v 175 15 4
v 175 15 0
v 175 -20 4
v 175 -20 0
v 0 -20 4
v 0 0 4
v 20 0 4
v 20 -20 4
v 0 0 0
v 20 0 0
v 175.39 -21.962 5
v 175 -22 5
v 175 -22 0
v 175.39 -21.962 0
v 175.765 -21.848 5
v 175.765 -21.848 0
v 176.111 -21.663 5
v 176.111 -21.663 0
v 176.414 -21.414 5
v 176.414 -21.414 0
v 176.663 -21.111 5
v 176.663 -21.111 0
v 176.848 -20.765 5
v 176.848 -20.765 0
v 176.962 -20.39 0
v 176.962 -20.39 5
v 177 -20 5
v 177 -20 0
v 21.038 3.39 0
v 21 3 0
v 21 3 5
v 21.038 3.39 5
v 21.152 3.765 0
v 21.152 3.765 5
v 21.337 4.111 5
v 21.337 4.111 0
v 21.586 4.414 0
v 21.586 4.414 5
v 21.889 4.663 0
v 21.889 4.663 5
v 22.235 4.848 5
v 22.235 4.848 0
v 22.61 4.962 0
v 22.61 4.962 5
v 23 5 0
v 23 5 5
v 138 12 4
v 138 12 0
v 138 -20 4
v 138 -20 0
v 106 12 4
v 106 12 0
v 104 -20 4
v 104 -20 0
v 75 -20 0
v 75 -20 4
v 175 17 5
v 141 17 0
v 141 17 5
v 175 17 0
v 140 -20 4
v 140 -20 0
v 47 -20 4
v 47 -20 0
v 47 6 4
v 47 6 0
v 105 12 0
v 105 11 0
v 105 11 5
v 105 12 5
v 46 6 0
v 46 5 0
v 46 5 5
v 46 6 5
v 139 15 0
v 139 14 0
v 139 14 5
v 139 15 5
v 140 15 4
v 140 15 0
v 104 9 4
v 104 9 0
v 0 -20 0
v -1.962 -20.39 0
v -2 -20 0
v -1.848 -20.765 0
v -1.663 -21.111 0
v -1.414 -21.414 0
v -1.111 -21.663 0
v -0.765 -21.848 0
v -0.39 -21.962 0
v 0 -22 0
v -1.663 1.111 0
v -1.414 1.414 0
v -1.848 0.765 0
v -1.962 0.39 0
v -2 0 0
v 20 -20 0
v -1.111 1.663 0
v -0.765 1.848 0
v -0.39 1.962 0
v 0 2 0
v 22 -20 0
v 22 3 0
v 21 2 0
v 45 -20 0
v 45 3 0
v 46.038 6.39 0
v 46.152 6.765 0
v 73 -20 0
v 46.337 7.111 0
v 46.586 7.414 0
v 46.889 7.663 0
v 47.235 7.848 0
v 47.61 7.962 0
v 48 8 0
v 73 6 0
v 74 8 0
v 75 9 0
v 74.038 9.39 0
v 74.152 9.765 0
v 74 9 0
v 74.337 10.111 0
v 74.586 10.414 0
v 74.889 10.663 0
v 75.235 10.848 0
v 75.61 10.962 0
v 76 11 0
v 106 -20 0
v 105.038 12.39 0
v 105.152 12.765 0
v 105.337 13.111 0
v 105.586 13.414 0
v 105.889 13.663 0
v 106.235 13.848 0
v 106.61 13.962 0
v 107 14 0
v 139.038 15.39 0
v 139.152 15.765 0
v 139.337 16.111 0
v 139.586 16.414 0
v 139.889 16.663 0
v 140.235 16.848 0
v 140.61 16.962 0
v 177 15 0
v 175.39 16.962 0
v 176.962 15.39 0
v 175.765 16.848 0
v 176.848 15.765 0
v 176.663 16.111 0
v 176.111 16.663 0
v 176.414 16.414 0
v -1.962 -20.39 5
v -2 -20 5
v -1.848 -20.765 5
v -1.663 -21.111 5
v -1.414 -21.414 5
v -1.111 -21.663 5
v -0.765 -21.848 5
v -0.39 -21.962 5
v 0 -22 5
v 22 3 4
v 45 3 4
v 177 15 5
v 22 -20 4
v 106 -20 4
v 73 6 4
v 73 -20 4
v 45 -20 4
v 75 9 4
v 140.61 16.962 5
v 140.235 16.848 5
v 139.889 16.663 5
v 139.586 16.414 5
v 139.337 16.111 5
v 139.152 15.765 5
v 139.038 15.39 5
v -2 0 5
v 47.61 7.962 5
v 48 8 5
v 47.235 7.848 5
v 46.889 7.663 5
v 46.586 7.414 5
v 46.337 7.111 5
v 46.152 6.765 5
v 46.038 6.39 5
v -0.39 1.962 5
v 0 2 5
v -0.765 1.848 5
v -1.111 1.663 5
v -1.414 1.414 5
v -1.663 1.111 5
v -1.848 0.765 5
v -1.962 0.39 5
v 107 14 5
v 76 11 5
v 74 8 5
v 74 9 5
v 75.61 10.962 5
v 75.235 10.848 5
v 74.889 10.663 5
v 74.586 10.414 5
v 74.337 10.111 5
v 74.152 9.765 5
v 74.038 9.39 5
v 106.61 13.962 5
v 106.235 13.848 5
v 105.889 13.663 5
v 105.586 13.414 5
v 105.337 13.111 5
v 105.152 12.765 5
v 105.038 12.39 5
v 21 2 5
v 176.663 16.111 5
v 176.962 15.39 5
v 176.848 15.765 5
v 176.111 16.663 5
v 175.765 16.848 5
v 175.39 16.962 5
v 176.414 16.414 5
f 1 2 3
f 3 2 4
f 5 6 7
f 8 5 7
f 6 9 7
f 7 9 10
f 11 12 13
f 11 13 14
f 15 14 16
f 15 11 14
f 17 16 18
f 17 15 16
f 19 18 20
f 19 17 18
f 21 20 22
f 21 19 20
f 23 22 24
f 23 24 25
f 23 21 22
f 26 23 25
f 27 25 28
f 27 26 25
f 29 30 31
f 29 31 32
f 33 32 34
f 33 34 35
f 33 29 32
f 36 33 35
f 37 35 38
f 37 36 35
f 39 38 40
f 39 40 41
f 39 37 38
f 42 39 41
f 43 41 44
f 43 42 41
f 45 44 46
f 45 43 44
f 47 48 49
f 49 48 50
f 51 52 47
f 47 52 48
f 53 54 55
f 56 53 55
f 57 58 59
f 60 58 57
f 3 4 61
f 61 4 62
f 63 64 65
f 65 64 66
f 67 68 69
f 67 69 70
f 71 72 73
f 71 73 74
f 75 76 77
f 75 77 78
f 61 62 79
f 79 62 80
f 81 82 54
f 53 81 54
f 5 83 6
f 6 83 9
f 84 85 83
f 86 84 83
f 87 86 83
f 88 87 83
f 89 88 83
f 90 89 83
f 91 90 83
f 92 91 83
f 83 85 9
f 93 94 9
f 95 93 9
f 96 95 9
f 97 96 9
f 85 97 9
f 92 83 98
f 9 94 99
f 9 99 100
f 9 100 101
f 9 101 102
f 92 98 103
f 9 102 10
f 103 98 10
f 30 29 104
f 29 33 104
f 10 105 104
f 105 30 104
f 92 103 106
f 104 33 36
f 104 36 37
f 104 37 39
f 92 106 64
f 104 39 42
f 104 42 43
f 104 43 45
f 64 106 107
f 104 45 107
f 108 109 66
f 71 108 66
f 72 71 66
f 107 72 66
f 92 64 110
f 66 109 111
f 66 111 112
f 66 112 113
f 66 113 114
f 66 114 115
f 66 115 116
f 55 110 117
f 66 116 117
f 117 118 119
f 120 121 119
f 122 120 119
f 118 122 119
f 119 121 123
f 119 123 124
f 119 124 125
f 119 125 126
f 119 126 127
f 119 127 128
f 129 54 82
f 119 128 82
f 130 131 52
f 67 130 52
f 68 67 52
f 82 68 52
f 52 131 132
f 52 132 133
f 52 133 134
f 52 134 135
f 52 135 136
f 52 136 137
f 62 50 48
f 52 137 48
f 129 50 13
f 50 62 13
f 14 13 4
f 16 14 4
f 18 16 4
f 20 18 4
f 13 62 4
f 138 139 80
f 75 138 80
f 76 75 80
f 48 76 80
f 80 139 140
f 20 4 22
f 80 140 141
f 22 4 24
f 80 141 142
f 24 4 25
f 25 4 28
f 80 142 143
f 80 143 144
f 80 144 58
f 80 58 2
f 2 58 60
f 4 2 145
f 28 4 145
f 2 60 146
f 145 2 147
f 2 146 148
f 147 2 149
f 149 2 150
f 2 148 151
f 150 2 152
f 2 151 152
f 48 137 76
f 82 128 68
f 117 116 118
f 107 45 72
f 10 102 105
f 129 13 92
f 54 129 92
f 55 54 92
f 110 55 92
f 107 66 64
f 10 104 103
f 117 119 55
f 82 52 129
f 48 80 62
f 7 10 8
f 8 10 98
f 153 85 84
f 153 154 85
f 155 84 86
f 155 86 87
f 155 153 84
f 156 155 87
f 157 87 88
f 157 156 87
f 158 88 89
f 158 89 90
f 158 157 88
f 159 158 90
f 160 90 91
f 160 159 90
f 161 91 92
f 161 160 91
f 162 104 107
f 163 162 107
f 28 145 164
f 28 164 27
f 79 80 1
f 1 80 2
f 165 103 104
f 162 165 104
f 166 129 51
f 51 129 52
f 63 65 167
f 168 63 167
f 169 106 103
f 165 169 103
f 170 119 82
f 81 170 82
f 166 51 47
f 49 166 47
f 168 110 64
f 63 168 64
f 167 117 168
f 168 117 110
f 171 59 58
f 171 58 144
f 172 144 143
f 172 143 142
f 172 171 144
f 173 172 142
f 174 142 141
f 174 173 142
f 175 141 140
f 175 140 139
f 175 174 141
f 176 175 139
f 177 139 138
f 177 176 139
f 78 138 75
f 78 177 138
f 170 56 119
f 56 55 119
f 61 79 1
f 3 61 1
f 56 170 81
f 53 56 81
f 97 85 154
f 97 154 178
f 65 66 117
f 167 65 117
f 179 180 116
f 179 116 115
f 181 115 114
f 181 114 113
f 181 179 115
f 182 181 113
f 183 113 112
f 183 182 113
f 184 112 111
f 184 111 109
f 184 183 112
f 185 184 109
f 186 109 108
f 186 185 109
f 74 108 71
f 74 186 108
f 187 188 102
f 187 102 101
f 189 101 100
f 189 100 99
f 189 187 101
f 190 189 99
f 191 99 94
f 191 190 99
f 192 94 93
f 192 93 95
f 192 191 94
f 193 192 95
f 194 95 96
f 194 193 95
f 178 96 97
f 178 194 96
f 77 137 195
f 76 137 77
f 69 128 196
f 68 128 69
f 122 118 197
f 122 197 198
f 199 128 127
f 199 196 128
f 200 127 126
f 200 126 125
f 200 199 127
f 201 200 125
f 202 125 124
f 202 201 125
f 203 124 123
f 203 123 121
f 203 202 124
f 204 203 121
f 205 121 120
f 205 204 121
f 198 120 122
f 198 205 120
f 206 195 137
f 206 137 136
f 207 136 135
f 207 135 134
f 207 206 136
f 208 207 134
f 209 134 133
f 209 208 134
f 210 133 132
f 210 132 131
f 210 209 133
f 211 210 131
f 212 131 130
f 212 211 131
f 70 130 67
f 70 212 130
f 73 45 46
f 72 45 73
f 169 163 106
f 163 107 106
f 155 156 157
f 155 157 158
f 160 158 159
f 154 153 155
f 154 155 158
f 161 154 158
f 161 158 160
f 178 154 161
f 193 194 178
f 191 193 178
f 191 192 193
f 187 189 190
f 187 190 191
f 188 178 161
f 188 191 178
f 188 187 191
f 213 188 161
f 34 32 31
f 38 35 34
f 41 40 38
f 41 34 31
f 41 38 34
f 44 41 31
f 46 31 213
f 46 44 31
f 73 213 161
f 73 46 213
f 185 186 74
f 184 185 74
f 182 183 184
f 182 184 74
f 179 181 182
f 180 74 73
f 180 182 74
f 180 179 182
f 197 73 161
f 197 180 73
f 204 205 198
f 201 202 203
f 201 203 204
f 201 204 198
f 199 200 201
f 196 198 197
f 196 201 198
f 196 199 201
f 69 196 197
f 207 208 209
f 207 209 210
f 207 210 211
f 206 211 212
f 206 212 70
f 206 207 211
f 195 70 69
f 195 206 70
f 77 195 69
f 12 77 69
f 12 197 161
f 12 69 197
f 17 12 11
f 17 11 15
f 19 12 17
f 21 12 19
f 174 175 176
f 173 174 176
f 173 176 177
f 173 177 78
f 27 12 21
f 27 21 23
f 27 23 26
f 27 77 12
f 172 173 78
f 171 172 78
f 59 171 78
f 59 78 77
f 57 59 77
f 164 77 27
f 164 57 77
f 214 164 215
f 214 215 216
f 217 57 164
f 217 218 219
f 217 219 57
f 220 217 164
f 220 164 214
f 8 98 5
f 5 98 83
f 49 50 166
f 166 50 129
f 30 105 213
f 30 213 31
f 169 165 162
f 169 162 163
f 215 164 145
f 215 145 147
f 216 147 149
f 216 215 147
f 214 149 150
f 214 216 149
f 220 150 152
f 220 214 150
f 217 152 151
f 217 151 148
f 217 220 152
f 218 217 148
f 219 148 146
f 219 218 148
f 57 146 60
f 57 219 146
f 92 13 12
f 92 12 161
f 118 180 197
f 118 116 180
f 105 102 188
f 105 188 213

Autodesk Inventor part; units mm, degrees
ref_plane "YZ Plane" through (0, 0, 0) normal (1, 0, 0) x (0, 1, 0)
ref_plane "XZ Plane" through (0, 0, 0) normal (0, 1, 0) x (-1, 0, 0)
ref_plane "XY Plane" through (0, 0, 0) normal (0, 0, 1) x (1, 0, 0)
sketch "스케치1" plane through (0, 0, 0) normal (0, 0, 1) x (1, 0, 0)
  line L0 (0, 0) -> (20, 0)
  line L1 (20, 0) -> (20, -20)
  line L2 (20, -20) -> (0, -20)
  line L3 (0, -20) -> (0, 0)
  line L4 (-2, 2) -> (21, 2)
  line L5 (21, 2) -> (21, -22)
  line L6 (21, -22) -> (-2, -22)
  line L7 (-2, -22) -> (-2, 2)
  line L8 (21, 2) -> (21, 5)
  line L9 (21, 5) -> (46, 5)
  line L10 (46, 5) -> (46, -22)
  line L11 (46, -22) -> (21, -22)
  line L12 (22, 3) -> (45, 3)
  line L13 (45, 3) -> (45, -20)
  line L14 (45, -20) -> (22, -20)
  line L15 (22, -20) -> (22, 3)
  line L16 (46, 5) -> (46, 8)
  line L17 (46, 8) -> (74, 8)
  line L18 (74, 8) -> (74, -22)
  line L19 (74, -22) -> (46, -22)
  line L20 (47, 6) -> (73, 6)
  line L21 (73, 6) -> (73, -20)
  line L22 (73, -20) -> (47, -20)
  line L23 (47, -20) -> (47, 6)
  line L24 (74, 8) -> (74, 11)
  line L25 (74, 11) -> (105, 11)
  line L26 (105, 11) -> (105, -22)
  line L27 (105, -22) -> (74, -22)
  line L28 (75, 9) -> (104, 9)
  line L29 (104, 9) -> (104, -20)
  line L30 (104, -20) -> (75, -20)
  line L31 (75, -20) -> (75, 9)
  line L32 (105, 11) -> (105, 14)
  line L33 (105, 14) -> (139, 14)
  line L34 (139, 14) -> (139, -22)
  line L35 (139, -22) -> (105, -22)
  line L36 (106, 12) -> (138, 12)
  line L37 (138, 12) -> (138, -20)
  line L38 (138, -20) -> (106, -20)
  line L39 (106, -20) -> (106, 12)
  line L40 (139, 14) -> (139, 17)
  line L41 (139, 17) -> (177, 17)
  line L42 (177, 17) -> (177, -22)
  line L43 (177, -22) -> (139, -22)
  line L44 (140, 15) -> (175, 15)
  line L45 (175, 15) -> (175, -20)
  line L46 (175, -20) -> (140, -20)
  line L47 (140, -20) -> (140, 15)
  dimension "d0" = 20
  dimension "d1" = 20
  dimension "d2" = 2
  dimension "d3" = 2
  dimension "d4" = 1
  dimension "d5" = 2
  dimension "d6" = 25
  dimension "d7" = 27
  dimension "d8" = 1
  dimension "d9" = 2
  dimension "d10" = 2
  dimension "d11" = 1
  dimension "d12" = 30
  dimension "d13" = 28
  dimension "d14" = 2
  dimension "d15" = 1
  dimension "d16" = 1
  dimension "d17" = 2
  dimension "d18" = 31
  dimension "d19" = 33
  dimension "d20" = 2
  dimension "d21" = 2
  dimension "d22" = 1
  dimension "d23" = 1
  dimension "d24" = 34
  dimension "d25" = 36
  dimension "d26" = 2
  dimension "d27" = 1
  dimension "d28" = 2
  dimension "d29" = 1
  dimension "d30" = 38
  dimension "d31" = 39
  dimension "d32" = 2
  dimension "d33" = 1
  dimension "d34" = 2
  dimension "d35" = 2
extrude "돌출1" add sketch "스케치1" along normal blind 4
sketch "스케치2" plane through (0, 0, 4) normal (0, 0, 1) x (1, 0, 0)
  line L0 (-2, -22) -> (177, -22) projected
  line L1 (177, -22) -> (177, 17) projected
  line L2 (177, 17) -> (139, 17) projected
  line L3 (139, 17) -> (139, 14) projected
  line L4 (139, 14) -> (105, 14) projected
  line L5 (105, 14) -> (105, 11) projected
  line L6 (105, 11) -> (74, 11) projected
  line L7 (74, 11) -> (74, 8) projected
  line L8 (74, 8) -> (46, 8) projected
  line L9 (46, 8) -> (46, 5) projected
  line L10 (46, 5) -> (21, 5) projected
  line L11 (21, 5) -> (21, 2) projected
  line L12 (21, 2) -> (-2, 2) projected
  line L13 (-2, 2) -> (-2, -22) projected
  line L14 (22, 3) -> (45, 3) projected
  line L15 (45, 3) -> (45, -20) projected
  line L16 (45, -20) -> (22, -20) projected
  line L17 (22, -20) -> (22, 3) projected
  line L18 (47, 6) -> (73, 6) projected
  line L19 (73, 6) -> (73, -20) projected
  line L20 (73, -20) -> (47, -20) projected
  line L21 (47, -20) -> (47, 6) projected
  line L22 (75, 9) -> (104, 9) projected
  line L23 (104, 9) -> (104, -20) projected
  line L24 (104, -20) -> (75, -20) projected
  line L25 (75, -20) -> (75, 9) projected
  line L26 (106, 12) -> (138, 12) projected
  line L27 (138, 12) -> (138, -20) projected
  line L28 (138, -20) -> (106, -20) projected
  line L29 (106, -20) -> (106, 12) projected
  line L30 (140, 15) -> (175, 15) projected
  line L31 (175, 15) -> (175, -20) projected
  line L32 (175, -20) -> (140, -20) projected
  line L33 (140, -20) -> (140, 15) projected
  line L34 (0, 0) -> (20, 0) projected
  line L35 (20, 0) -> (20, -20) projected
  line L36 (20, -20) -> (0, -20) projected
  line L37 (0, -20) -> (0, 0) projected
extrude "돌출2" add sketch "스케치2" along normal blind 1 contours L13 L12 L11 L10 L9 L8 L7 L6 L5 L4 L3 L2 L1 L0 | L14 L15 L16 L17 | L18 L19 L20 L21 | L22 L23 L24 L25 | L26 L27 L28 L29 | L30 L31 L32 L33 | L34 L35 L36 L37
fillet "모깎기1" radius 2 9 edges at (177, -22, 2.5) (177, 17, 2.5) (139, 17, 2.5) (105, 14, 2.5) (74, 11, 2.5) (46, 8, 2.5) (21, 5, 2.5) (-2, 2, 2.5) (-2, -22, 2.5)
properties part number "d_pocket"
